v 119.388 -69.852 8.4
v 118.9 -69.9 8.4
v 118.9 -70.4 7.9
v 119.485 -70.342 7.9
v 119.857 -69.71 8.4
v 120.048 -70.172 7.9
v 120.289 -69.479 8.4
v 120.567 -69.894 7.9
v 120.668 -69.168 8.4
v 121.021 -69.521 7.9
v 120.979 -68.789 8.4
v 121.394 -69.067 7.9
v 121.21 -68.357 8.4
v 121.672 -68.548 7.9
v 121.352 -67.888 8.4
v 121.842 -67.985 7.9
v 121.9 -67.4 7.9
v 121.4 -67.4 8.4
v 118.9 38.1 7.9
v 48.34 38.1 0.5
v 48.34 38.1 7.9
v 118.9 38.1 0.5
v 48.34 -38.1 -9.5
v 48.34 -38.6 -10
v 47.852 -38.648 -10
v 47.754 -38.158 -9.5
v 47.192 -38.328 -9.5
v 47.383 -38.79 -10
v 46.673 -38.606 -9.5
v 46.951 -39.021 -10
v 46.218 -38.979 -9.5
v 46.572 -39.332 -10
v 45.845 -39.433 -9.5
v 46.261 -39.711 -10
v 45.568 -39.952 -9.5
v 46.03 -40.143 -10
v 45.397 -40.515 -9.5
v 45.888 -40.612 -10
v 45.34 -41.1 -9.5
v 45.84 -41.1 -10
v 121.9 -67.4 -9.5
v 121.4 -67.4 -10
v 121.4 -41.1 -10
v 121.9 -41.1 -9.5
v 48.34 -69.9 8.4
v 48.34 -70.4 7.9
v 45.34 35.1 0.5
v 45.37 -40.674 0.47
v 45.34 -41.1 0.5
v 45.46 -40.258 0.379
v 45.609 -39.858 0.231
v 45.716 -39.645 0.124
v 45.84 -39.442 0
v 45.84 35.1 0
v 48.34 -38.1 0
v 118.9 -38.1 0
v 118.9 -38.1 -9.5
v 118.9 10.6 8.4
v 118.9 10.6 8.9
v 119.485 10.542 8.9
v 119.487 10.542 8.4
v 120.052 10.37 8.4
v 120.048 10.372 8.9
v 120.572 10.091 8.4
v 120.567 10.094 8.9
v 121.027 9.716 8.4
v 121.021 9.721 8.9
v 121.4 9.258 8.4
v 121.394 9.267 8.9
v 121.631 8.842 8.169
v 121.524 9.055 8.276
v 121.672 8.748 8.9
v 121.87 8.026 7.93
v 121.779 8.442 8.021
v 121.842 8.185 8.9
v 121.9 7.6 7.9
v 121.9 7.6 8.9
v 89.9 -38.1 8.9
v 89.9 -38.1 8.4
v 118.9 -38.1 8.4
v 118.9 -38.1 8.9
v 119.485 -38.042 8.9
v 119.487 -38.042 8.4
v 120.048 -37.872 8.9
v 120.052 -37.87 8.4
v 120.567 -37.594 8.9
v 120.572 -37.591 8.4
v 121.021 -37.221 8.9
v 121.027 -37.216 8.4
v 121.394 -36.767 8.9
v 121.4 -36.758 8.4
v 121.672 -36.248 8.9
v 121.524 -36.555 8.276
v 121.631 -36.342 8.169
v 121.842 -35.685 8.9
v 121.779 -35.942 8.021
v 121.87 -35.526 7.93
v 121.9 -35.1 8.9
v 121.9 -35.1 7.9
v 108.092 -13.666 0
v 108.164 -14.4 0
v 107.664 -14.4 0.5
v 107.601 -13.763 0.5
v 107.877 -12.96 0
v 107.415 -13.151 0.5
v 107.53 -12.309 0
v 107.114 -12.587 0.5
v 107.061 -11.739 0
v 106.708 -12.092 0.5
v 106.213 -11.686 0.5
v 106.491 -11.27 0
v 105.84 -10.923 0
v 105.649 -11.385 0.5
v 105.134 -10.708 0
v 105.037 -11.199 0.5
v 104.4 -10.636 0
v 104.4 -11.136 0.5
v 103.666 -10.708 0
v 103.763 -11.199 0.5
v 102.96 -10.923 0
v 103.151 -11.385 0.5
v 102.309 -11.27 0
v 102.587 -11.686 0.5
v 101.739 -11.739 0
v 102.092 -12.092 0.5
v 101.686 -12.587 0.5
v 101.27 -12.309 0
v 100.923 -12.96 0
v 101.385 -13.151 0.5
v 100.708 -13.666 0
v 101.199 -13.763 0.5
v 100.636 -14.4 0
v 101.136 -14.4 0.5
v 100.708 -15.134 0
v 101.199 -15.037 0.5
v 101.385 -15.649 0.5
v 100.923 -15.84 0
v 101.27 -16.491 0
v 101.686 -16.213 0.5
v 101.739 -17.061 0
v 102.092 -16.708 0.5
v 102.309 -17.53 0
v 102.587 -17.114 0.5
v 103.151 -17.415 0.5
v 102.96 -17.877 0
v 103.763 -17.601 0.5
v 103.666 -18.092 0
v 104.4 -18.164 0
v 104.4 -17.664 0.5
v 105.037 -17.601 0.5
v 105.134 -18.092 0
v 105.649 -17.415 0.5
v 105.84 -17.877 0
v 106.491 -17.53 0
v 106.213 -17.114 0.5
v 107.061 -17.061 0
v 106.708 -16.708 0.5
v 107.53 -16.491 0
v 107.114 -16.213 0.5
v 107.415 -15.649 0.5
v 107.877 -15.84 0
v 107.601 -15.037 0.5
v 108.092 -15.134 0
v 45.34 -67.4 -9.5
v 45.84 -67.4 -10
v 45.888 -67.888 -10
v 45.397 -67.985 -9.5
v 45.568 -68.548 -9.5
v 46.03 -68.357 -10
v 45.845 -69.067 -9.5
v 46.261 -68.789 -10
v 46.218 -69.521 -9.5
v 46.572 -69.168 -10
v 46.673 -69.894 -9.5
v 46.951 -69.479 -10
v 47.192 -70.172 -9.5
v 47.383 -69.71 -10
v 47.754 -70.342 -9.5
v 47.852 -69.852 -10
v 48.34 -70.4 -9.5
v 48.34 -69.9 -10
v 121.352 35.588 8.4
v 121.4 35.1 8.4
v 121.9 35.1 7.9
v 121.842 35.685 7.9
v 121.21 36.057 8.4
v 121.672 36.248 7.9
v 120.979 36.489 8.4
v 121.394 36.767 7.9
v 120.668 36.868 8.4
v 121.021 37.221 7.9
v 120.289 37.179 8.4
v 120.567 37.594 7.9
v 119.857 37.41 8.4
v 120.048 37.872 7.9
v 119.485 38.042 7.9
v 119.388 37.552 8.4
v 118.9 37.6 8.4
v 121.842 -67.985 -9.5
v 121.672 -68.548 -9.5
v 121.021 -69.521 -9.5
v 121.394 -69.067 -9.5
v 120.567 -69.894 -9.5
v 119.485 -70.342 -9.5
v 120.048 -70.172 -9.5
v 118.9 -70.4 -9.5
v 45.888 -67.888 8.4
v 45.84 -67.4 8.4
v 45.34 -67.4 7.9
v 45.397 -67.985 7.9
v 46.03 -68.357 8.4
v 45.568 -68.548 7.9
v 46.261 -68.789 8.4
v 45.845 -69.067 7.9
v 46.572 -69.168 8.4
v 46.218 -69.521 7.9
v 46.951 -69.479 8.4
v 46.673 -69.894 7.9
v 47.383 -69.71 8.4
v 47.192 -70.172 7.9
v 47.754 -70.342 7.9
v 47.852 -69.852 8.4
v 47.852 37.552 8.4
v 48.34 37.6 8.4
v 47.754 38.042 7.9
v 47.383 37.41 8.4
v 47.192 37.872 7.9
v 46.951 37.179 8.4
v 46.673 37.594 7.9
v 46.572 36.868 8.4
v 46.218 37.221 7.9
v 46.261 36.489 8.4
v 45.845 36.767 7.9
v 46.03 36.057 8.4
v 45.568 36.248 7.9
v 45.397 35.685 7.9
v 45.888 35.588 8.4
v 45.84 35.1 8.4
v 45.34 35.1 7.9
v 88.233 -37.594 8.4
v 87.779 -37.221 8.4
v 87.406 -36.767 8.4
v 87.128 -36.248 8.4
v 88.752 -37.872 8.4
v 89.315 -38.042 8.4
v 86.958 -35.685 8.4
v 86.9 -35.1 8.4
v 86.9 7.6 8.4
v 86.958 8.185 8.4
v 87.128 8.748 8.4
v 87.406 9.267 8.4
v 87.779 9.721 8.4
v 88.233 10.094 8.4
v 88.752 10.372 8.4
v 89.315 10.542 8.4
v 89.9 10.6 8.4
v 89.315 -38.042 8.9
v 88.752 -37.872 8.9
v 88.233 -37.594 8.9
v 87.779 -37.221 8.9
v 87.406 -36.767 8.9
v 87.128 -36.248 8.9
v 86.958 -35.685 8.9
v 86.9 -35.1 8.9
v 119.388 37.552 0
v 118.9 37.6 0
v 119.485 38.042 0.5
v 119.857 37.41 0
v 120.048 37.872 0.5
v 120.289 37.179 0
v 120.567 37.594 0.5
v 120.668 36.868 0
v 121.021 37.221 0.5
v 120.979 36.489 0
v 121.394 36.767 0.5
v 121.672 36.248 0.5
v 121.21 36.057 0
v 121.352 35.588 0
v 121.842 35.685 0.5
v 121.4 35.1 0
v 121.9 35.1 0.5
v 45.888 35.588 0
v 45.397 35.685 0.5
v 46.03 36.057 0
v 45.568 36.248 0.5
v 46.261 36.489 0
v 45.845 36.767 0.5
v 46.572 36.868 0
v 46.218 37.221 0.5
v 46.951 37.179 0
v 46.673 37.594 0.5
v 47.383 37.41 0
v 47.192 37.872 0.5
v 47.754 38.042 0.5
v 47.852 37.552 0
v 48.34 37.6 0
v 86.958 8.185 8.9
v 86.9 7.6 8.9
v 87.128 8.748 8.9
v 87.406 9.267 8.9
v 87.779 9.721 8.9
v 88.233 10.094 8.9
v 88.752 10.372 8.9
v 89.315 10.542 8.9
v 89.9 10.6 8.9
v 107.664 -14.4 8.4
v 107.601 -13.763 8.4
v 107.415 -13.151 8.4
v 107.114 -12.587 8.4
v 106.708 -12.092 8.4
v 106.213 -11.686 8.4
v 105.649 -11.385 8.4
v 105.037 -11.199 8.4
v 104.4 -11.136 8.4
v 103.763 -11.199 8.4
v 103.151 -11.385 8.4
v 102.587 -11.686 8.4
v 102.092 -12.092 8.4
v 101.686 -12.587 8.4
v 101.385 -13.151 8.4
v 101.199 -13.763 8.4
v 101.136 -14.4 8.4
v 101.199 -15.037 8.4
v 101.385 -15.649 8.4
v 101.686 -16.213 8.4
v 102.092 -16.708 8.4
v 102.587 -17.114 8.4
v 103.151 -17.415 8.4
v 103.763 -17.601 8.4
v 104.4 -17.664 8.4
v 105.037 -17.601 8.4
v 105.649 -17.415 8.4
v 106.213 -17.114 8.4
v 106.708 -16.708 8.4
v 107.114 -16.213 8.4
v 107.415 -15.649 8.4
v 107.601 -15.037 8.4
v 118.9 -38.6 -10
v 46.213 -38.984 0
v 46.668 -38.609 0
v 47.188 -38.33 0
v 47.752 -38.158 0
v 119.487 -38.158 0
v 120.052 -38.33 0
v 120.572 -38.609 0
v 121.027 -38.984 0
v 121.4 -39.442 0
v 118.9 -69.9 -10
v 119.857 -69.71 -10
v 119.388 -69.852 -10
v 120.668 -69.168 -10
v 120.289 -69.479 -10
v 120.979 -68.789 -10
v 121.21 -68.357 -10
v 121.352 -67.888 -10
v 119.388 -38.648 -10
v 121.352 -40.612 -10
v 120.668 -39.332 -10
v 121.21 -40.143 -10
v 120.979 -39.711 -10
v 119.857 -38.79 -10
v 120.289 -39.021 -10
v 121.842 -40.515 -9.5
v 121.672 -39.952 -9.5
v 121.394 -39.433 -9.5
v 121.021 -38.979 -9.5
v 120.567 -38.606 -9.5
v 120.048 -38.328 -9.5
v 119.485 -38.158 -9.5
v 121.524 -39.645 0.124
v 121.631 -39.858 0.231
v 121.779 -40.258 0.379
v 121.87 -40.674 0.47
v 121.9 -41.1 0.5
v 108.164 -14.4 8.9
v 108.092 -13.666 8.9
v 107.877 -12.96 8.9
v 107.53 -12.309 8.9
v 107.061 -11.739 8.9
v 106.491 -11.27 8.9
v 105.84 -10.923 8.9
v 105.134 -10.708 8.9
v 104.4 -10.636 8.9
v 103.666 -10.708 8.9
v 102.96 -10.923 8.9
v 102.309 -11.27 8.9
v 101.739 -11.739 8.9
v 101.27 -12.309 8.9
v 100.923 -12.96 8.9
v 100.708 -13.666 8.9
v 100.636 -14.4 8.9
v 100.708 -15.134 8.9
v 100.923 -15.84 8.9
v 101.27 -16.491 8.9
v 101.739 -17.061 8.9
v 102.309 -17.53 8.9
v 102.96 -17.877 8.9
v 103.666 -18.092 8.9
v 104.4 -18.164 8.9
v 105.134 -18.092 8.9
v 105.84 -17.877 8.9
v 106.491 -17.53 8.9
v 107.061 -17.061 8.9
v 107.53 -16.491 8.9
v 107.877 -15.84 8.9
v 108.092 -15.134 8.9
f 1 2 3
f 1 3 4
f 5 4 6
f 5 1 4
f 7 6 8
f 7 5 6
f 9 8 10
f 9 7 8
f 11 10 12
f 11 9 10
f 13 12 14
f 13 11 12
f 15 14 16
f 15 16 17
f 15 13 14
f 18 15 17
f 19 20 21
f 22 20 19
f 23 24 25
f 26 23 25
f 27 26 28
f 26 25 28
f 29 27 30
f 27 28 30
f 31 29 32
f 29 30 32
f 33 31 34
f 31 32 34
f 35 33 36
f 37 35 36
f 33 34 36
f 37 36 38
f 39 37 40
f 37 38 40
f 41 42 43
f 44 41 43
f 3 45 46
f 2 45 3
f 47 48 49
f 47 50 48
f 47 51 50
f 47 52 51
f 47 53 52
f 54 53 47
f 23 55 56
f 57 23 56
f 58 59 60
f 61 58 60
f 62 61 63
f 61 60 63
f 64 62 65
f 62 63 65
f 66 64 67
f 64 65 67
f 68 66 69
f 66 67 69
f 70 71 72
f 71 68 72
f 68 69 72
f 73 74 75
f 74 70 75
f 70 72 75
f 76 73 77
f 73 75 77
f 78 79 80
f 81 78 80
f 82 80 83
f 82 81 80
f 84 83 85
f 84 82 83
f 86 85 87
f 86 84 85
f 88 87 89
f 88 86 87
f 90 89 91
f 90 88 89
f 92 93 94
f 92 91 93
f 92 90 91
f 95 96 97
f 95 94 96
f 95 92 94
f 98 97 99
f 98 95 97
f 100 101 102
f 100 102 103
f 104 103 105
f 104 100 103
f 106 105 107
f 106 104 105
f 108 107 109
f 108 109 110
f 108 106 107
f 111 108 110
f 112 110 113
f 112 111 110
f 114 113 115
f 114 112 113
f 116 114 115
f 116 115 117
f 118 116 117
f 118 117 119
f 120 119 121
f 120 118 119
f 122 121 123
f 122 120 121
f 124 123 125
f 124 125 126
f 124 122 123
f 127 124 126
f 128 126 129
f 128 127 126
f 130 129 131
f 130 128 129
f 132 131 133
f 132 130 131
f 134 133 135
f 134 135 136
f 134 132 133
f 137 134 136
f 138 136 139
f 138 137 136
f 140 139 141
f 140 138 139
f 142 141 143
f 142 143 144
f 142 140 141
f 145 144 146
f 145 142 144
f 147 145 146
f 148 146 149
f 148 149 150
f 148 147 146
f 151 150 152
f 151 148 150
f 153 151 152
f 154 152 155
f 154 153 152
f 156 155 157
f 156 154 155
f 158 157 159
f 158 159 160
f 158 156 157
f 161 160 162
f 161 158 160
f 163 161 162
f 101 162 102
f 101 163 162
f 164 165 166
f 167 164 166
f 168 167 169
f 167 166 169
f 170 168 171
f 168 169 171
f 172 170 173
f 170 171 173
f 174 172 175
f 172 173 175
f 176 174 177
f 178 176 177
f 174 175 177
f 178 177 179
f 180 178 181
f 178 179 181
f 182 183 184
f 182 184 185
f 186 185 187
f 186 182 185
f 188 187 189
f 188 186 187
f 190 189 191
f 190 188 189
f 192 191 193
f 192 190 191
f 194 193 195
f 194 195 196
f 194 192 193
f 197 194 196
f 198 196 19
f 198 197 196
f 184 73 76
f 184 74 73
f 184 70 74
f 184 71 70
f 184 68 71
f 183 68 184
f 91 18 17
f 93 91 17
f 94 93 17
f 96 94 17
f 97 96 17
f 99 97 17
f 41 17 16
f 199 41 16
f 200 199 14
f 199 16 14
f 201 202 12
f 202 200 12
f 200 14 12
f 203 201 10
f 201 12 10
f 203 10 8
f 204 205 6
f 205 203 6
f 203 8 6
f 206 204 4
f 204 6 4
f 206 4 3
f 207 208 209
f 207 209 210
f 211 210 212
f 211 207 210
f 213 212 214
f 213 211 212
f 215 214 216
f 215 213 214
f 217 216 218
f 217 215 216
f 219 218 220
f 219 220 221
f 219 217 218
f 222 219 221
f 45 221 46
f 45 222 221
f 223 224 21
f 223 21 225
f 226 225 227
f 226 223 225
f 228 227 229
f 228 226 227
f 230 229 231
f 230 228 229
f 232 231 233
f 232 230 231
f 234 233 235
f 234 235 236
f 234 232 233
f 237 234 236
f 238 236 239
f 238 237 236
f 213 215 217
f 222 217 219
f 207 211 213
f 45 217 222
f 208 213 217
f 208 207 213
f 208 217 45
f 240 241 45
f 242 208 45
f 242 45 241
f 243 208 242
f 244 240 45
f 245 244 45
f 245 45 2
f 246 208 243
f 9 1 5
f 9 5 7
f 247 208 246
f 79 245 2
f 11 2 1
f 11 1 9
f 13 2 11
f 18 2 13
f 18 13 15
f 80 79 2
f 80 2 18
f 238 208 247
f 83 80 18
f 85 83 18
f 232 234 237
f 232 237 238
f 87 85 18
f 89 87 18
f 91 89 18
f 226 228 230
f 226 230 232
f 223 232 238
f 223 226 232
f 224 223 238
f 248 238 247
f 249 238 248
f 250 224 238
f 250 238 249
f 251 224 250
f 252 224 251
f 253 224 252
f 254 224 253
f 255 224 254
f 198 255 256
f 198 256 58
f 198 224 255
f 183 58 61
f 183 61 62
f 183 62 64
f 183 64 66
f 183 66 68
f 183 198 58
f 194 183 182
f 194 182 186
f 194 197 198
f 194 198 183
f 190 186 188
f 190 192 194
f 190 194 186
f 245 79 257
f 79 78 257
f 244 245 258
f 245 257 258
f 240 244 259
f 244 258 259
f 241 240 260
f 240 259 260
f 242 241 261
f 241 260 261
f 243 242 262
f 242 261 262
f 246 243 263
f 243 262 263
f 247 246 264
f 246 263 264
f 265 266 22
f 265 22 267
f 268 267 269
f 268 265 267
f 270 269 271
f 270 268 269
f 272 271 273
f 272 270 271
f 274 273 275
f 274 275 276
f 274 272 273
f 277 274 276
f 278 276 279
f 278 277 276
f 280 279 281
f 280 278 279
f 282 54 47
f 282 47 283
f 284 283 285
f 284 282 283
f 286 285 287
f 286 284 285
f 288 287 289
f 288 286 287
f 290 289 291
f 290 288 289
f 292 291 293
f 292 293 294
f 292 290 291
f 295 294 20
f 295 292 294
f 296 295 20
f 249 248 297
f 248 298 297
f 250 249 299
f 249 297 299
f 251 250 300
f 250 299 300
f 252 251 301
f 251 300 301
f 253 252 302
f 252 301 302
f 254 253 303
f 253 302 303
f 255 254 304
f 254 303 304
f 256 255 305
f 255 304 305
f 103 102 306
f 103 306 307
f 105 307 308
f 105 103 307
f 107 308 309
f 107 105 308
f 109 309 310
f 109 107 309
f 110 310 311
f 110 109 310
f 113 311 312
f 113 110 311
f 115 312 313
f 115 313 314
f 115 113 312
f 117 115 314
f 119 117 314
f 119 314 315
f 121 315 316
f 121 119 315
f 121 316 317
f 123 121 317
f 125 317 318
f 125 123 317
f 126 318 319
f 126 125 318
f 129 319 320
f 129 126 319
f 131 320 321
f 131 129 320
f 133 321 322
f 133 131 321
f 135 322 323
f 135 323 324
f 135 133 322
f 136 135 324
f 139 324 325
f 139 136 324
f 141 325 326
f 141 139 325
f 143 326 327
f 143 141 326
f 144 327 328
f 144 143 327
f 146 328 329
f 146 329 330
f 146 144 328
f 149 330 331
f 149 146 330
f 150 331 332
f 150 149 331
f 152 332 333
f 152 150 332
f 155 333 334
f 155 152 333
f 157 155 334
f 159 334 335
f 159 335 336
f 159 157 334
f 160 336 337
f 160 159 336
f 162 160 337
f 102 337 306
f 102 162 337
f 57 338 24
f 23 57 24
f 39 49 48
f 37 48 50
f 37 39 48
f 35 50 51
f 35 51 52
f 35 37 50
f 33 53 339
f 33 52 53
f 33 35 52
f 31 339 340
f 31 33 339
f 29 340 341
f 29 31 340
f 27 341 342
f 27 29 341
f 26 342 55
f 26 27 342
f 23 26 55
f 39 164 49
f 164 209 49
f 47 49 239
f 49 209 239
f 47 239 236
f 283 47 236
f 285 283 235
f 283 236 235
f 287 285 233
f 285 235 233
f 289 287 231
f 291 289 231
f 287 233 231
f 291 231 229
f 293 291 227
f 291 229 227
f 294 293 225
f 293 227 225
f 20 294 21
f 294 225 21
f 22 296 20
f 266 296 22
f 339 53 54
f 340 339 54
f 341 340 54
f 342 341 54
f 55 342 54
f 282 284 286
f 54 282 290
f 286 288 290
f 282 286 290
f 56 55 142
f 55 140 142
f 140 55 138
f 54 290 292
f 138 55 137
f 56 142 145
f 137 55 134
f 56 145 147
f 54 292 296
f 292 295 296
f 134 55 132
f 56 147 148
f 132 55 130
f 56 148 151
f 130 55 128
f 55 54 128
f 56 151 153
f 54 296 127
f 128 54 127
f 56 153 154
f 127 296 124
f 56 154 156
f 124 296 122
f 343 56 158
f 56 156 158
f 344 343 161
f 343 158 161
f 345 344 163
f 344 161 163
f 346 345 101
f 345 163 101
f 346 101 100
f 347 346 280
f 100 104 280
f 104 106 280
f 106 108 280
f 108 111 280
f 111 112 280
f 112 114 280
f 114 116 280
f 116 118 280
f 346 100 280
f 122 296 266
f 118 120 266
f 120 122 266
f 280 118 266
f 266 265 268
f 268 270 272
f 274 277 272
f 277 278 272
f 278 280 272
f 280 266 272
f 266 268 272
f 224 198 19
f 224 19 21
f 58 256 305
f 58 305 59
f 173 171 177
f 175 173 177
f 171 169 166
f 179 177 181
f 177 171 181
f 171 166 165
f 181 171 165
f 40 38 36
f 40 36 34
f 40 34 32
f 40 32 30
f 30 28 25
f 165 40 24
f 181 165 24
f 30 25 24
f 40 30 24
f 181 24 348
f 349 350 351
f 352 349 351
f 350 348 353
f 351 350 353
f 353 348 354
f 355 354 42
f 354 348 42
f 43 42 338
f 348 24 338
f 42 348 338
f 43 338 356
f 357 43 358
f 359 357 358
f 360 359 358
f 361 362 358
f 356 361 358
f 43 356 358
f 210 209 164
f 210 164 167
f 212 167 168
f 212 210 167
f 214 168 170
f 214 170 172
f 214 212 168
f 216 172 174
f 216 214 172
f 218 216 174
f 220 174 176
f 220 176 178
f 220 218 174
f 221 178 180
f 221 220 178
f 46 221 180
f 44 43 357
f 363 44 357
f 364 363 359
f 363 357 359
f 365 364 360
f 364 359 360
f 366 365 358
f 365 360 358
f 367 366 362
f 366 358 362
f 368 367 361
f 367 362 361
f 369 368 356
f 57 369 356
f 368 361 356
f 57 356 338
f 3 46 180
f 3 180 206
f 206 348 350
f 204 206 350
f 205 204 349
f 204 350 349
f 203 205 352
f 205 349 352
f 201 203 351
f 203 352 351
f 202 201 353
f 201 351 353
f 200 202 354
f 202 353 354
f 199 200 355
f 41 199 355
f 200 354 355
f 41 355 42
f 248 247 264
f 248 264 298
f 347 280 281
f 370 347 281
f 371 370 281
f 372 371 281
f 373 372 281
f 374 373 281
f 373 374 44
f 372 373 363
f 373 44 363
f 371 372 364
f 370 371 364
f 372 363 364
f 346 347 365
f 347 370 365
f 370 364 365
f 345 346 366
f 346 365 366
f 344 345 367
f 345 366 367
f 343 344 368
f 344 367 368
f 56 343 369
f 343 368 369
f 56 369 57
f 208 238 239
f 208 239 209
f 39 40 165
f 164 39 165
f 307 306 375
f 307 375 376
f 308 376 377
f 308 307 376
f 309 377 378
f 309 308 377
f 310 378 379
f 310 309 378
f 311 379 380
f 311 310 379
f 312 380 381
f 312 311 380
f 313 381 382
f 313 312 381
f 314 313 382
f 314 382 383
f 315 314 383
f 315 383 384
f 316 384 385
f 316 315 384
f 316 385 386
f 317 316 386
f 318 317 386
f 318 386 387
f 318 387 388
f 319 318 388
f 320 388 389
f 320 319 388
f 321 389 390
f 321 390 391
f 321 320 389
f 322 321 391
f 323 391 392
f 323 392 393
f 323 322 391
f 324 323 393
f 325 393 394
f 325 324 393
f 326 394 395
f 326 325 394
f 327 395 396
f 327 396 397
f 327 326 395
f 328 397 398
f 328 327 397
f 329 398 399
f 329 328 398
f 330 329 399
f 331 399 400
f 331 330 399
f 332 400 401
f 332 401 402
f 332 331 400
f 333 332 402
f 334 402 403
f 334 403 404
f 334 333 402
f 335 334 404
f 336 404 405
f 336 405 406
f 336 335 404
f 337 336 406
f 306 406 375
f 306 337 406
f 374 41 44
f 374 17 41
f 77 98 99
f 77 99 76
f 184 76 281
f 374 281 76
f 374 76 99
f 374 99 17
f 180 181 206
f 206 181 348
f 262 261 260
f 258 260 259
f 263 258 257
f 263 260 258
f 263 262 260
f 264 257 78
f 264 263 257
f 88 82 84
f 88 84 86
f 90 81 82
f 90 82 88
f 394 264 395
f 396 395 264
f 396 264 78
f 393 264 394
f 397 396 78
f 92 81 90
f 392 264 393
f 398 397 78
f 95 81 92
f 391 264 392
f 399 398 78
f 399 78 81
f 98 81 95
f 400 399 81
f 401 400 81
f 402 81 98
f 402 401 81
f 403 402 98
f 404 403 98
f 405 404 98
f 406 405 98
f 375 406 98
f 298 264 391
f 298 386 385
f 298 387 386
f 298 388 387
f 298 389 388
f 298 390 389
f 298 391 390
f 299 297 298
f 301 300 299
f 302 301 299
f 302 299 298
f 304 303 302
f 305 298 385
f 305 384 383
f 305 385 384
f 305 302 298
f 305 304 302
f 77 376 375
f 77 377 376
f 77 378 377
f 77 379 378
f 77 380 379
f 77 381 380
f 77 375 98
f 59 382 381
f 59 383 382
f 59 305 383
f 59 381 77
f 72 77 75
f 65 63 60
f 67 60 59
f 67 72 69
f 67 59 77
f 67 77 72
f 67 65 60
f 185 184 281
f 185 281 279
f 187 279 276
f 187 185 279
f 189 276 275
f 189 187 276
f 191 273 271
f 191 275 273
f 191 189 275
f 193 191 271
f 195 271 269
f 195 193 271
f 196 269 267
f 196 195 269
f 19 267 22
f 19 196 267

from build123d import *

# Parameters (mm, degrees)
SKETCH1_W           = 76.560291348
SKETCH1_H           = 108.5
SKETCH1_R           = 3.2639
BOSS_EXTRUDE1_DEPTH = 8.4
SKETCH1_3_W         = 35
SKETCH1_3_H         = 48.7
SKETCH1_3_R         = 3.2639
BOSS_EXTRUDE2_DEPTH = 8.9
SKETCH1_4_W         = 76.560291348
SKETCH1_4_H         = 32.3
BOSS_EXTRUDE3_DEPTH = 10
FILLET1_R           = 3
CHAMFER1_SIZE       = 0.5


with BuildPart() as part:
    # Sketch1 → Boss-Extrude1 (new body)
    with BuildSketch(Plane.XY):
        with Locations((83.619854326, -16.15)):
            Rectangle(SKETCH1_W, SKETCH1_H)
        with Locations((104.4, -14.4)):
            Circle(SKETCH1_R, mode=Mode.SUBTRACT)
    extrude(amount=BOSS_EXTRUDE1_DEPTH)

    # Sketch1<3> → Boss-Extrude2 (add)
    with BuildSketch(Plane.XY):
        with Locations((104.4, -13.75)):
            Rectangle(SKETCH1_3_W, SKETCH1_3_H)
        with Locations((104.4, -14.4)):
            Circle(SKETCH1_3_R, mode=Mode.SUBTRACT)
    extrude(amount=BOSS_EXTRUDE2_DEPTH)

    # Sketch1<4> → Boss-Extrude3 (add)
    with BuildSketch(Plane.XY):
        with Locations((83.619854326, -54.25)):
            Rectangle(SKETCH1_4_W, SKETCH1_4_H)
    extrude(amount=-BOSS_EXTRUDE3_DEPTH)

    # Fillet1
    fillet1_edges = [part.edges().sort_by_distance(p)[0] for p in [
        (45.339708652, 38.1, 4.2),
        (121.9, -38.1, 8.65),
        (86.9, -38.1, 8.65),
        (86.9, 10.6, 8.65),
        (121.9, 10.6, 8.65),
        (45.339708652, -70.4, -0.8),
        (121.9, -38.1, -5),
        (45.339708652, -38.1, -5),
        (121.9, -70.4, -0.8),
        (121.9, 38.1, 4.2),
    ]]
    fillet(fillet1_edges, radius=FILLET1_R)

    # Chamfer1
    chamfer1_edges = [part.edges().sort_by_distance(p)[0] for p in [
        (121.9, 22.85, 8.4),
        (101.1361, -14.4, 8.9),
        (101.1361, -14.4, 0),
        (121.9, -54.25, -10),
        (121.9, -1.5, 0),
        (121.9, -52.75, 8.4),
        (45.339708652, -16.15, 8.4),
        (45.339708652, -1.5, 0),
        (45.339708652, -54.25, -10),
        (83.619854326, 38.1, 0),
        (121.021320344, 37.221320344, 0),
        (46.218388308, 37.221320344, 0),
        (83.619854326, 38.1, 8.4),
        (83.619854326, -70.4, 8.4),
        (121.021320344, -69.521320344, 8.4),
        (46.218388308, -69.521320344, 8.4),
        (121.021320344, 37.221320344, 8.4),
        (46.218388308, 37.221320344, 8.4),
        (83.619854326, -38.1, -10),
        (83.619854326, -70.4, -10),
        (121.021320344, -69.521320344, -10),
        (46.218388308, -69.521320344, -10),
        (121.021320344, -38.978679656, -10),
        (46.218388308, -38.978679656, -10),
    ]]
    chamfer(chamfer1_edges, length=CHAMFER1_SIZE)


solid = part.part
